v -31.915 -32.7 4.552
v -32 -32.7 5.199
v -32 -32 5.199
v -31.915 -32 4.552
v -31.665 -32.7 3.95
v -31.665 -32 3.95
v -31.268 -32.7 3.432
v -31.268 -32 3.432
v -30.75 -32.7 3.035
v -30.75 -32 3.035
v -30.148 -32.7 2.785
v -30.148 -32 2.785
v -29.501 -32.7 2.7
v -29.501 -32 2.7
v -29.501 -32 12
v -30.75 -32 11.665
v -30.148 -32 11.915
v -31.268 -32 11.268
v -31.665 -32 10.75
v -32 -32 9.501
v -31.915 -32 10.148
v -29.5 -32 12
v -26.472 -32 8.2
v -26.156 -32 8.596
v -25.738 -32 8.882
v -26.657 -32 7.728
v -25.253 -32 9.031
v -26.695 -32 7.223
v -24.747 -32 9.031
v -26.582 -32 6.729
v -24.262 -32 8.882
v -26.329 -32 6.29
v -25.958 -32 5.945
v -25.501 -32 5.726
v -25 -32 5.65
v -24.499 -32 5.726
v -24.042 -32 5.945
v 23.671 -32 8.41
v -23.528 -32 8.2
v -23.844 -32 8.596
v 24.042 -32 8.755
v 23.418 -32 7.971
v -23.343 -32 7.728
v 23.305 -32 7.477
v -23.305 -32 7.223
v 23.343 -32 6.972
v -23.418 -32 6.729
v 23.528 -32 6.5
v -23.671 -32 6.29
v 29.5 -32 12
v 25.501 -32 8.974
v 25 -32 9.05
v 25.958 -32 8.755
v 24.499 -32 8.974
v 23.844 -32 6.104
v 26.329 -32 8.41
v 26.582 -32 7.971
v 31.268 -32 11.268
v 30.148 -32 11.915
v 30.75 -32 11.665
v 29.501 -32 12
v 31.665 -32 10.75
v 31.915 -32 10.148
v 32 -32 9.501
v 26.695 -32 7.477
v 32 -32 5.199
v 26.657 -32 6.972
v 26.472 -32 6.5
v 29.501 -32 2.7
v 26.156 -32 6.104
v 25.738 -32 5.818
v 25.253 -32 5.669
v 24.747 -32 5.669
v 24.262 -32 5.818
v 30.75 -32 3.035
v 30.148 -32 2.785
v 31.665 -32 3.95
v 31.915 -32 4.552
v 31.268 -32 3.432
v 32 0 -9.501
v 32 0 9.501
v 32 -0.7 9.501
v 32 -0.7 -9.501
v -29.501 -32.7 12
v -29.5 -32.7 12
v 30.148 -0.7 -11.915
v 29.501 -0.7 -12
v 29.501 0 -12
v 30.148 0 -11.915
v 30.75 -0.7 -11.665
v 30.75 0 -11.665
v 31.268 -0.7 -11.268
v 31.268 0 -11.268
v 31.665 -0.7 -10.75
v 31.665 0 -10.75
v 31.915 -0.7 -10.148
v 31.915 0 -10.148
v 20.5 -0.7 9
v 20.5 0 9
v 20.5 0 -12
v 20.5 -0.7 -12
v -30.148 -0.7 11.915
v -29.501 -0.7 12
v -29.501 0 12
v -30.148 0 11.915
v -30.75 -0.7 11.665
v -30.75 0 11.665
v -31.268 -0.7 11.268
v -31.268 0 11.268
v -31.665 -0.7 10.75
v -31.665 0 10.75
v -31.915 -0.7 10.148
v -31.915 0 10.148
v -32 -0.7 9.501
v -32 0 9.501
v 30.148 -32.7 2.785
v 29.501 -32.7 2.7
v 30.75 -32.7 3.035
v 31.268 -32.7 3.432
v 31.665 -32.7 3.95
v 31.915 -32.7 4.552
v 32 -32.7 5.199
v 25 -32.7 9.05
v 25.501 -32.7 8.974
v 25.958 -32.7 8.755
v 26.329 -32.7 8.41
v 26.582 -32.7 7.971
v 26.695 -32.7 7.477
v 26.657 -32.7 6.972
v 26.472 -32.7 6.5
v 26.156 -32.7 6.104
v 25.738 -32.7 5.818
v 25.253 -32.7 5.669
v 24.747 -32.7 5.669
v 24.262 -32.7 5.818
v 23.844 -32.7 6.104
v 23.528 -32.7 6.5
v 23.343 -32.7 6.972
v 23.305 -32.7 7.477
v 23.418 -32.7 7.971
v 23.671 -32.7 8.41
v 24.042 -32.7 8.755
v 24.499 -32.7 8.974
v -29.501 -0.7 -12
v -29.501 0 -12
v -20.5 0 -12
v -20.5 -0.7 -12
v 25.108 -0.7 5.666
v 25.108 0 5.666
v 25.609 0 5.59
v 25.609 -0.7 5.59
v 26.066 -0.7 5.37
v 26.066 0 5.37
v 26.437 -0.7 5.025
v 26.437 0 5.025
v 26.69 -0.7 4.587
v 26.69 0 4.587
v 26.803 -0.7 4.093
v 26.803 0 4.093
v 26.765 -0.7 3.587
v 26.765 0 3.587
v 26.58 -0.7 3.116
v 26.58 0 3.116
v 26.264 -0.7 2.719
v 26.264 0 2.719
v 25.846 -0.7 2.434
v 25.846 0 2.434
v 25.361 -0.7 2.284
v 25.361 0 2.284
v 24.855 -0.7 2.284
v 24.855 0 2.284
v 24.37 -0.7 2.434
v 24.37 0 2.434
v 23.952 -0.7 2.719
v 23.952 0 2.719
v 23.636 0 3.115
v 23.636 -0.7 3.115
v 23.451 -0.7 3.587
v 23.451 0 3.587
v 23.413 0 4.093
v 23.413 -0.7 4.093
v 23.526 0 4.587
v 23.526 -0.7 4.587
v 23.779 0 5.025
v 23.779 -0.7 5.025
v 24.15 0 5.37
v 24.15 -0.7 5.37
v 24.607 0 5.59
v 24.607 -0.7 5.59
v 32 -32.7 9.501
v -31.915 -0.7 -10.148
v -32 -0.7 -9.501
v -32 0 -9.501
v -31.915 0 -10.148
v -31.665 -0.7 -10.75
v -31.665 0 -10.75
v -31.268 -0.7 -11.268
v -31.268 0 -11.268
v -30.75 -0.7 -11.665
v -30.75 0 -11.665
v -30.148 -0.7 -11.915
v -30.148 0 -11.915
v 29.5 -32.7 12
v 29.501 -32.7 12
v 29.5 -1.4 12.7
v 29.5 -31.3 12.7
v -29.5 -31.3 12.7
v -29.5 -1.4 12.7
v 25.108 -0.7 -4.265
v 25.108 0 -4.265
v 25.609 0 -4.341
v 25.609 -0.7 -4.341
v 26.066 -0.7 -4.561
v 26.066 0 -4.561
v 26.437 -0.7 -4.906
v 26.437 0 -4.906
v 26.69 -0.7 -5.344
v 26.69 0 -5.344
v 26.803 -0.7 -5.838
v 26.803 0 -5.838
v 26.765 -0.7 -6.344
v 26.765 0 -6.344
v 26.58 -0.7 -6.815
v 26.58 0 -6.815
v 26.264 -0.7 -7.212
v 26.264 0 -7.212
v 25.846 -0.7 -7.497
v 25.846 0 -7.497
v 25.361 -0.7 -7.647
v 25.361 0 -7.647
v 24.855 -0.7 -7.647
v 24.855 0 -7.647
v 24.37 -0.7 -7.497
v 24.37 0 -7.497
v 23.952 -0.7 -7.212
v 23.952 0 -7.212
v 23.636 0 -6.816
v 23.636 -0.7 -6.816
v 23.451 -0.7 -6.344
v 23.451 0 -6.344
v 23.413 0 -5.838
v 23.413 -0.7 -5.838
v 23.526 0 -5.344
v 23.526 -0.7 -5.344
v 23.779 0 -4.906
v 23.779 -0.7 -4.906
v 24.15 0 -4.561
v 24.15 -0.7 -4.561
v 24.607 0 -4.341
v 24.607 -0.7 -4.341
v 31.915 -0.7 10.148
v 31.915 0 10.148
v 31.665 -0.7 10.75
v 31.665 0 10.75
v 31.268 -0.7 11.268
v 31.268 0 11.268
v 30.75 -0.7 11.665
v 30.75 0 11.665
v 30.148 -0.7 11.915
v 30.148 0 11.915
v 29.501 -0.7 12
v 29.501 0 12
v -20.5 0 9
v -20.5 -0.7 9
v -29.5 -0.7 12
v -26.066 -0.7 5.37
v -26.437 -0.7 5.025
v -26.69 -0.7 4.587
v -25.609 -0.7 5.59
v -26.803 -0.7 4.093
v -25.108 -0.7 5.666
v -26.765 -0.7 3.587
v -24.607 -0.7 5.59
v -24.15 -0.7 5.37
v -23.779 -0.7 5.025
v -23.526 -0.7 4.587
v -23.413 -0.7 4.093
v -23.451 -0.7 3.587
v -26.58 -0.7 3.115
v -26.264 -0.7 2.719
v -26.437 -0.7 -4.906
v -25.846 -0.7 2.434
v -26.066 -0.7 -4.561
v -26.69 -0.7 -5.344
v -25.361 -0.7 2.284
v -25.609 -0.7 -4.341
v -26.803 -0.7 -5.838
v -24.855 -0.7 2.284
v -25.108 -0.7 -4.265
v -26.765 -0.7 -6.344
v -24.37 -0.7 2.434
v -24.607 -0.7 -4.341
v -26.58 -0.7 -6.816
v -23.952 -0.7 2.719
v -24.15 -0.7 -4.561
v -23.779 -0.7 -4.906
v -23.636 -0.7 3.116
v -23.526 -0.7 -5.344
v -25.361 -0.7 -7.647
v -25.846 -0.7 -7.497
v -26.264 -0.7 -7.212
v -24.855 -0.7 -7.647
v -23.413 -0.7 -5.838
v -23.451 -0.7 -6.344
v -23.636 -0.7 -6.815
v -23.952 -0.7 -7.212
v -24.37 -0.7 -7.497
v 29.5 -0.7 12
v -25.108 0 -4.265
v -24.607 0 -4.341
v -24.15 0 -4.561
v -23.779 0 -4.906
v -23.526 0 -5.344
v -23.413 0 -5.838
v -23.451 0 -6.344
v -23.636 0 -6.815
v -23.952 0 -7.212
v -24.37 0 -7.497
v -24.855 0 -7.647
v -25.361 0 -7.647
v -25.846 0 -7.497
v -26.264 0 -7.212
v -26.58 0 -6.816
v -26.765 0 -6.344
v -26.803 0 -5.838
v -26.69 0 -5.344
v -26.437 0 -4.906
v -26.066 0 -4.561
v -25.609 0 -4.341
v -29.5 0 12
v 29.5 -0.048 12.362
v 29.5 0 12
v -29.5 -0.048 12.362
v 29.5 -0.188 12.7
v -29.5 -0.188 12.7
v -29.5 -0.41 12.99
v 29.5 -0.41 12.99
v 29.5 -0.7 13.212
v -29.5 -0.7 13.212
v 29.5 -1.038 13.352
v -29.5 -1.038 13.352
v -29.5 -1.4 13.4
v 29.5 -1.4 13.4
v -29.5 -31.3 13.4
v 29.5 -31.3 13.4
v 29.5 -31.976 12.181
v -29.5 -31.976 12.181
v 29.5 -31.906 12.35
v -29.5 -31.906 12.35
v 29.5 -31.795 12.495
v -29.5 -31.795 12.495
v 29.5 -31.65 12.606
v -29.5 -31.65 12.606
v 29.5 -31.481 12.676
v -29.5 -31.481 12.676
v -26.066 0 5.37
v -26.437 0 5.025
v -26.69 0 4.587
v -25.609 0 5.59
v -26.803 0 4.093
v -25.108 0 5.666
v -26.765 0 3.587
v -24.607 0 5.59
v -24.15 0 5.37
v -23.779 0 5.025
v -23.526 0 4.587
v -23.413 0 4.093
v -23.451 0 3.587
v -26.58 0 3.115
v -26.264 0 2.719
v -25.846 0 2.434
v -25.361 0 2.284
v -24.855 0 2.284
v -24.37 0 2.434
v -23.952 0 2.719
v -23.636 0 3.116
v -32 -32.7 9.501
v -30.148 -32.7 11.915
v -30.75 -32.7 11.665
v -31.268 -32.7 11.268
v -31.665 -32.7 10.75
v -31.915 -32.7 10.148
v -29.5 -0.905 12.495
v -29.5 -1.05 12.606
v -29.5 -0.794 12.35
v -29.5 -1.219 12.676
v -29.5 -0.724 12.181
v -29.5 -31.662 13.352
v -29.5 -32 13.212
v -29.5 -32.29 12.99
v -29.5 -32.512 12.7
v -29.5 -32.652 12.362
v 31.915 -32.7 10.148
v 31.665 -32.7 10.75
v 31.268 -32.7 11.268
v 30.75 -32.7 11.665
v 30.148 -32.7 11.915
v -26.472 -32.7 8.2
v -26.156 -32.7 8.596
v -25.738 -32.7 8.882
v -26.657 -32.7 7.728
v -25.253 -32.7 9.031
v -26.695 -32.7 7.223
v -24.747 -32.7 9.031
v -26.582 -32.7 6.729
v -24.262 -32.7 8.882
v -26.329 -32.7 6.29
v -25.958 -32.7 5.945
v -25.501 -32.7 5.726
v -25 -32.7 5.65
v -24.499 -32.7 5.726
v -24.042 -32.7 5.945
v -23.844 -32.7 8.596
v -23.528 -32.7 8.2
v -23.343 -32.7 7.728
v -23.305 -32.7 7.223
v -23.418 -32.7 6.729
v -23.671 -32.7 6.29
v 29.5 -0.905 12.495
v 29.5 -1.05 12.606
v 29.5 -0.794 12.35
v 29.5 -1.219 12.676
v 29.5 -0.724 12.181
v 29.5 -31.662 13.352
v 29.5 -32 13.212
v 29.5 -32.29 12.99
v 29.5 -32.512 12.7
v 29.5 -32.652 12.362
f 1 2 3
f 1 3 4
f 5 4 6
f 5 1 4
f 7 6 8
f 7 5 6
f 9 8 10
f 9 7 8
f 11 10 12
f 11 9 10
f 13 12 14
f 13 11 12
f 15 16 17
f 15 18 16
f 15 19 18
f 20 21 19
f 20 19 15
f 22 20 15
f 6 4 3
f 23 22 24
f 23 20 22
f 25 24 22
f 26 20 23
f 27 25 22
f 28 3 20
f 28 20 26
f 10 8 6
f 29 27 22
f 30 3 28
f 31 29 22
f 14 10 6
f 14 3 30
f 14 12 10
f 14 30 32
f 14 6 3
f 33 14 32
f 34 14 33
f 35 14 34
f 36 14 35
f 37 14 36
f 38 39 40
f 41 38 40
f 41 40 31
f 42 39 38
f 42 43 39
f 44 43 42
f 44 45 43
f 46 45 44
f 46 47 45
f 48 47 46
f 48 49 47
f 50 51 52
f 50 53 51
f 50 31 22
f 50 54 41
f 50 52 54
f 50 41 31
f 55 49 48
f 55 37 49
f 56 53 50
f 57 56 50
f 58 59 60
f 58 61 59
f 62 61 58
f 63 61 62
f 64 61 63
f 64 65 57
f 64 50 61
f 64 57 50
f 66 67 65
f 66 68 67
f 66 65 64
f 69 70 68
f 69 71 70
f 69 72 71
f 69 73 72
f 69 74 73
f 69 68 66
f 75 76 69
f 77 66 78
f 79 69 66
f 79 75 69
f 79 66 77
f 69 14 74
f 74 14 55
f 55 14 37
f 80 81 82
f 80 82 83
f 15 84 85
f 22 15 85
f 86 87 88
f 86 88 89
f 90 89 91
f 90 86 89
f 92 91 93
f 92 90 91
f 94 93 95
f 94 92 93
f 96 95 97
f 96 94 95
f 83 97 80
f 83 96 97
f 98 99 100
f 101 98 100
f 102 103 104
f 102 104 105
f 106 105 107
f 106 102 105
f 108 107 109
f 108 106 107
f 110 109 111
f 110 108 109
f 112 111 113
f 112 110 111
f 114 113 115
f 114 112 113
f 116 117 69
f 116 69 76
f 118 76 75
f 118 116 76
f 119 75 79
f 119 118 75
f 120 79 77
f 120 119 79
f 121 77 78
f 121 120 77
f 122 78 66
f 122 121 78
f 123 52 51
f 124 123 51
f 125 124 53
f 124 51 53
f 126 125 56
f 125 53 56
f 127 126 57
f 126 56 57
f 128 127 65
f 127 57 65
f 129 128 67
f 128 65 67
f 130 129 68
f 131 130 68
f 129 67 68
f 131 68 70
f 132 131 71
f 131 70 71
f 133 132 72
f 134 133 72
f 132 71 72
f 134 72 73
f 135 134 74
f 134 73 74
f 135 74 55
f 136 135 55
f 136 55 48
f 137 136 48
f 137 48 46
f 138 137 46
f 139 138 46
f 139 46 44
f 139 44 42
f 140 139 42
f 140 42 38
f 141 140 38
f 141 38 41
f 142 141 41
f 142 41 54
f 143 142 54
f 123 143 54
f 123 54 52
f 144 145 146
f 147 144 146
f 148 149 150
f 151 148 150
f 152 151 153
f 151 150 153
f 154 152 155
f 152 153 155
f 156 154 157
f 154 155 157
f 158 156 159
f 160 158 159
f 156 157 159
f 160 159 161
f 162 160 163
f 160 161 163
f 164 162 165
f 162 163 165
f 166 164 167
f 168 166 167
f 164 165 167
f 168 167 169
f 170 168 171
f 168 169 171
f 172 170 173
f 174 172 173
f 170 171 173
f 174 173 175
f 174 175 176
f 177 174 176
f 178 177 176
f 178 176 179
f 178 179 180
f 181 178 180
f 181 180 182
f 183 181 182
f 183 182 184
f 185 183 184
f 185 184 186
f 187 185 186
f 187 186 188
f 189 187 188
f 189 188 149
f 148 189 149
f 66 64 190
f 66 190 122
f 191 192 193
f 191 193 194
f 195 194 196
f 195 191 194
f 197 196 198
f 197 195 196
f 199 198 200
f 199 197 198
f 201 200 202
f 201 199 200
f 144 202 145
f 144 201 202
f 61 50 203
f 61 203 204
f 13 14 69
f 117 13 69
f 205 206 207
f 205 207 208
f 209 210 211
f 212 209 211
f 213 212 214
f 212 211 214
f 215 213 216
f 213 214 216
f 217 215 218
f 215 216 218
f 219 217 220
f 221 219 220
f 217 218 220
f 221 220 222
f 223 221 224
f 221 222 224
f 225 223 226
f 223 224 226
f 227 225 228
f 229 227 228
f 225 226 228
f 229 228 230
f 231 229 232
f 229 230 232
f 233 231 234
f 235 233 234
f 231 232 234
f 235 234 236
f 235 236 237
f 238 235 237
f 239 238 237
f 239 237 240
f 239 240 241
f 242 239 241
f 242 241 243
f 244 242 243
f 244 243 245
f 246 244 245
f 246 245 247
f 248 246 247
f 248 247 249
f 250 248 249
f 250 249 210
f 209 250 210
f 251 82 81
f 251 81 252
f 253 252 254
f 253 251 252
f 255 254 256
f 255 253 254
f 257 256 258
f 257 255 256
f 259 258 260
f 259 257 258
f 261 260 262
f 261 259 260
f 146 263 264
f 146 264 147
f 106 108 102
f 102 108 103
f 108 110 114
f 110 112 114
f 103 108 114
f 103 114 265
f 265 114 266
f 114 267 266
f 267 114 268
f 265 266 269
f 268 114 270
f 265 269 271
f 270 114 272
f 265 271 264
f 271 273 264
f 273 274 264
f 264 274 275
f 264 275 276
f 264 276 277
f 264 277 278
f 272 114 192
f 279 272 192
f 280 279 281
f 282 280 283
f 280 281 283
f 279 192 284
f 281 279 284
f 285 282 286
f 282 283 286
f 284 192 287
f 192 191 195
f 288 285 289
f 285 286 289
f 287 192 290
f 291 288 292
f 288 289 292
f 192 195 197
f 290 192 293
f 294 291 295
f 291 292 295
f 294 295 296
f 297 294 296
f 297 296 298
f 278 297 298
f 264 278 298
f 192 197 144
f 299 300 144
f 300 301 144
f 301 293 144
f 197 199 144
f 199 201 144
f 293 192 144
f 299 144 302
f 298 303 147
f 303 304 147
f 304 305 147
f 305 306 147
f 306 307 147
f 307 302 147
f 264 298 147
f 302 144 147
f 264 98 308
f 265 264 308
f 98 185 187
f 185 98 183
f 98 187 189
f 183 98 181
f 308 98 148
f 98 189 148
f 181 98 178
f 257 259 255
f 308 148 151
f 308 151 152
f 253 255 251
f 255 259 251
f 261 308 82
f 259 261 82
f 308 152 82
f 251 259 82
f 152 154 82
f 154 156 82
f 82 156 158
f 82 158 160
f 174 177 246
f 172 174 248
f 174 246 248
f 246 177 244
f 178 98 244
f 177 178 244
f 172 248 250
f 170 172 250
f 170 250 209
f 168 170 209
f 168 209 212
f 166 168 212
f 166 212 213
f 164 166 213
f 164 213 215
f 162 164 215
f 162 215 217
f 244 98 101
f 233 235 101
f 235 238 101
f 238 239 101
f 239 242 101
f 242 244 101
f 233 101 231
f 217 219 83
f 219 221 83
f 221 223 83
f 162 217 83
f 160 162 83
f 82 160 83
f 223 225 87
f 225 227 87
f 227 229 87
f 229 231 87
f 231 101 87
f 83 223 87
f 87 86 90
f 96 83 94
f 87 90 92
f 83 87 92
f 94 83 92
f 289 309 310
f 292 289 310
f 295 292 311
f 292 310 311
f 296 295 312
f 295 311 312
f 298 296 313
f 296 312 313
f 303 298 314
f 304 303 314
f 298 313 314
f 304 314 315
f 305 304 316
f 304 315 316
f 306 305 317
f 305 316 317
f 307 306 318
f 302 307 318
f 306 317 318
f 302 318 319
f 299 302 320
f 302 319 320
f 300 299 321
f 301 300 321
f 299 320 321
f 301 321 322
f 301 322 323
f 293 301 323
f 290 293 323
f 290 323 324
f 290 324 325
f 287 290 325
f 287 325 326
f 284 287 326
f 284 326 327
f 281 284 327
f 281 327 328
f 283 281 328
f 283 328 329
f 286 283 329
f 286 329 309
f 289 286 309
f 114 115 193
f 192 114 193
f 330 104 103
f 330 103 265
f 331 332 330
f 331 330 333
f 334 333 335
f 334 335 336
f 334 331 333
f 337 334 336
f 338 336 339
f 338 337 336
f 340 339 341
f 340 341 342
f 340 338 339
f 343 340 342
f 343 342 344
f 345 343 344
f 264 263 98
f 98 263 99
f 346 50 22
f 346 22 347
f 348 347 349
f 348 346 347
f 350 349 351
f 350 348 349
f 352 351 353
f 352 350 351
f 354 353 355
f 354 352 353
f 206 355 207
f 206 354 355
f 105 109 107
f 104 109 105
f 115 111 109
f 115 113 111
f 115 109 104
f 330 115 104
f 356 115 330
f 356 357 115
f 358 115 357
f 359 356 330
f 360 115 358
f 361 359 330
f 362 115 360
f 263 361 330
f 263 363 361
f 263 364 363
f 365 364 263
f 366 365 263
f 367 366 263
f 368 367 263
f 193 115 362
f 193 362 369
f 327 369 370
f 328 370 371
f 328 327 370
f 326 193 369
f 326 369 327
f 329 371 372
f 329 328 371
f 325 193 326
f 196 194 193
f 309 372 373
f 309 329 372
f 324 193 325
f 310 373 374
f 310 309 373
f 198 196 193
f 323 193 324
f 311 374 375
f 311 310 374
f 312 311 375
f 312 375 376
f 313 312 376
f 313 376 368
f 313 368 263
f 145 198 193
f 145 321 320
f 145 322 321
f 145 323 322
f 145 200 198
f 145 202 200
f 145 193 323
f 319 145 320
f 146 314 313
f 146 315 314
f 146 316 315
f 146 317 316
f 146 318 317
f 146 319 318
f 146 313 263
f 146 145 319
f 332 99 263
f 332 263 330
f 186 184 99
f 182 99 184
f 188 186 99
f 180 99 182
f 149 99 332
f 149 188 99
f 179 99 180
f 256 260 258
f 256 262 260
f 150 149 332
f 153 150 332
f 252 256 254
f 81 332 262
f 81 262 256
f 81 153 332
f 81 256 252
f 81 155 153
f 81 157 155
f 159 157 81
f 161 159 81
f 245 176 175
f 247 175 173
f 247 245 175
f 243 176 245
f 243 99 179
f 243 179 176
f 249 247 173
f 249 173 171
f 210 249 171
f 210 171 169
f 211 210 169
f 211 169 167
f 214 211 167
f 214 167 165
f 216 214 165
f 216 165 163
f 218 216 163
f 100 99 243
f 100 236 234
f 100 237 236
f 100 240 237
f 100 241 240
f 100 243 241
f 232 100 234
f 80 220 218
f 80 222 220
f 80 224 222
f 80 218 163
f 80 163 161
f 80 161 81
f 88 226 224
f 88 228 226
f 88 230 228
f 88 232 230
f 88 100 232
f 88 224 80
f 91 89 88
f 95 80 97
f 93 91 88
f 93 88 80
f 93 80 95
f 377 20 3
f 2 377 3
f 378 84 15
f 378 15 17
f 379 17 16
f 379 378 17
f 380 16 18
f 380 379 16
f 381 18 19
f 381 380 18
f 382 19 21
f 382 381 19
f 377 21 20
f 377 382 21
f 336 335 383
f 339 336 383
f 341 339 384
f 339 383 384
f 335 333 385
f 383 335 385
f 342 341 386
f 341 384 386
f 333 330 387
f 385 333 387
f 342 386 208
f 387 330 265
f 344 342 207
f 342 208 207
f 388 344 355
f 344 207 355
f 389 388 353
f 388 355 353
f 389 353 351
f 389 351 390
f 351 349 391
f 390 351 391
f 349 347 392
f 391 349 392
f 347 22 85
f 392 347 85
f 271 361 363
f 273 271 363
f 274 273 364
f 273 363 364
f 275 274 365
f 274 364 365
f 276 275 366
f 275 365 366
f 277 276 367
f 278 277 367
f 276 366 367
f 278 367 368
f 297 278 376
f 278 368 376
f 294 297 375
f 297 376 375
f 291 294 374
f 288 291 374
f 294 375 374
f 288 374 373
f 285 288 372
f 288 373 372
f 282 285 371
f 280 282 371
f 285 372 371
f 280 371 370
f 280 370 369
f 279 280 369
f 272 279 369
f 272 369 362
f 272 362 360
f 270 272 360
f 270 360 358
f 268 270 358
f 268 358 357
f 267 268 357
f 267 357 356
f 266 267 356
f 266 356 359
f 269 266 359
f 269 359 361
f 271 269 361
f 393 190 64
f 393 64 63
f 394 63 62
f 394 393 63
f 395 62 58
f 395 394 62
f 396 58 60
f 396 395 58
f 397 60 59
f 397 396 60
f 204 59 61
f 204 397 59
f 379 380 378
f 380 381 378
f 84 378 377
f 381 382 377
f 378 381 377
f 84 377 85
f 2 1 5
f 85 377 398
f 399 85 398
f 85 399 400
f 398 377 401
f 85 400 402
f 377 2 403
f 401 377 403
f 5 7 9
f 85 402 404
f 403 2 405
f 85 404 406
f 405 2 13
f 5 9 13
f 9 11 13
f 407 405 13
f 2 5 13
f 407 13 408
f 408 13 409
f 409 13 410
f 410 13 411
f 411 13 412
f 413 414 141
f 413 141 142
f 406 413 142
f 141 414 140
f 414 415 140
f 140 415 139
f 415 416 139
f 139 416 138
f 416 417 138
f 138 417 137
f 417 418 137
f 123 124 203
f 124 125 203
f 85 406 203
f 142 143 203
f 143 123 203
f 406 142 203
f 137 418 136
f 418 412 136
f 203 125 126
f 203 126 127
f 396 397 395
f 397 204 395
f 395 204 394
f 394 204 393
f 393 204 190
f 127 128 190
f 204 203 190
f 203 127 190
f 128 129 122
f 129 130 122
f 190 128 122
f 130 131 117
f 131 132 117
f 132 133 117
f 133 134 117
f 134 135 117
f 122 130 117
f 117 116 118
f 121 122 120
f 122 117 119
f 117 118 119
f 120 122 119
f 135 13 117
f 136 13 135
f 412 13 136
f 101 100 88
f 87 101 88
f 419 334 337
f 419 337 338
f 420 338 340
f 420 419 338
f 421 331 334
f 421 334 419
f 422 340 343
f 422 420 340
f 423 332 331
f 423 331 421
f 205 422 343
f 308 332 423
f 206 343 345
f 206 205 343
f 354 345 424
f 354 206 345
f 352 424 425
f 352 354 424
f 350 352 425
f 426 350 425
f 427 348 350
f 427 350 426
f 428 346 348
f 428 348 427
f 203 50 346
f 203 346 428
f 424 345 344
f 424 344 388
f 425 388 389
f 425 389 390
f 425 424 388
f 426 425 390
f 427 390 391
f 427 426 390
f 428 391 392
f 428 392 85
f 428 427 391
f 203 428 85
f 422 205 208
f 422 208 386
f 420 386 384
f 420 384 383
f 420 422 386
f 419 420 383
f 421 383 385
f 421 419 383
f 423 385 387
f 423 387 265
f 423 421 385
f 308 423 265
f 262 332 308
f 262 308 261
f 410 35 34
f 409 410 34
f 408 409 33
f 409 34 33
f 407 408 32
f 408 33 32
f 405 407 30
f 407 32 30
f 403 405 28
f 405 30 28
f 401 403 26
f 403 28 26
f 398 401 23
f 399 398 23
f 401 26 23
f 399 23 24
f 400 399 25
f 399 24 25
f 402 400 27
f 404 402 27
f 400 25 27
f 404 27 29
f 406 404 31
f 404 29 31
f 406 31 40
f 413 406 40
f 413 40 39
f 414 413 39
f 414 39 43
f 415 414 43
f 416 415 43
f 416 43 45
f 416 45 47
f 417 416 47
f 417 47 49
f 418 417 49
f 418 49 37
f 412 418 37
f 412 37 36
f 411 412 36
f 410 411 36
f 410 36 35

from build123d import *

# Parameters (mm, degrees)
SKETCH4_W                    = 64
SKETCH4_H                    = 24
BASE_FLANGE2_DEPTH           = 0.7
CUT_EXTRUDE1_REACH           = 36.183
SKETCH7_W                    = 41
SKETCH7_H                    = 21
CUT_EXTRUDE2_REACH           = 36.183
SKETCH8_R                    = 1.7
EDGE_FLANGE1_DEPTH           = 59
EDGE_FLANGE2_STRIP_W         = 4.2
EDGE_FLANGE2_STRIP_H         = 0.7
EDGE_FLANGE2_STRIP_CUT_DEPTH = 59
EDGE_FLANGE2_DEPTH           = 59
SKETCH16_W                   = 2.5
SKETCH16_H                   = 9.3
TAB1_DEPTH                   = 0.7
CUT_EXTRUDE3_REACH           = 49.197
SKETCH15_R                   = 1.7
BREAK_CORNER1_START          = -32.7
BREAK_CORNER1_DEPTH          = 32.7
BREAK_CORNER1_2_DEPTH        = 0.7


# Read off the part's stored shape, not the designer's step: Break-Corner1
# Sheet-metal steps are written as plain solids
with BuildPart() as part:
    # Sketch4 → Base-Flange2 (new body)
    with BuildSketch(Plane(origin=(0, 0, 0), x_dir=(1, 0, 0), z_dir=(0, 1, 0))):
        Rectangle(SKETCH4_W, SKETCH4_H)
    extrude(amount=-BASE_FLANGE2_DEPTH)

    # Sketch7 → Cut-Extrude1 (cut, up to next)
    with BuildSketch(Plane(origin=(0, 0, 0), x_dir=(1, 0, 0), z_dir=(0, 1, 0)), mode=Mode.PRIVATE) as cut_extrude1_sk1:
        with Locations((0, 1.5)):
            Rectangle(SKETCH7_W, SKETCH7_H)
    cut_extrude1_tool1 = extrude(cut_extrude1_sk1.sketch, amount=-CUT_EXTRUDE1_REACH, mode=Mode.PRIVATE) & part.part
    add(cut_extrude1_tool1.solids().sort_by_distance((0, 0, -1.5))[0], mode=Mode.SUBTRACT)

    # Sketch8 → Cut-Extrude2 (cut, up to next)
    with BuildSketch(Plane(origin=(0, 0, 0), x_dir=(1, 0, 0), z_dir=(0, 1, 0)), mode=Mode.PRIVATE) as cut_extrude2_sk1:
        with Locations(Location((-25.108, -3.9655, 0), (0, 0, 270))):
            Circle(SKETCH8_R)
    cut_extrude2_tool1 = extrude(cut_extrude2_sk1.sketch, amount=-CUT_EXTRUDE2_REACH, mode=Mode.PRIVATE) & part.part
    # Sketch8 → Cut-Extrude2 (cut, up to next)
    with BuildSketch(Plane(origin=(0, 0, 0), x_dir=(1, 0, 0), z_dir=(0, 1, 0)), mode=Mode.PRIVATE) as cut_extrude2_sk2:
        with Locations(Location((-25.108, 5.9655, 0), (0, 0, 270))):
            Circle(SKETCH8_R)
    cut_extrude2_tool2 = extrude(cut_extrude2_sk2.sketch, amount=-CUT_EXTRUDE2_REACH, mode=Mode.PRIVATE) & part.part
    # Sketch8 → Cut-Extrude2 (cut, up to next)
    with BuildSketch(Plane(origin=(0, 0, 0), x_dir=(1, 0, 0), z_dir=(0, 1, 0)), mode=Mode.PRIVATE) as cut_extrude2_sk3:
        with Locations(Location((25.108, -3.9655, 0), (0, 0, 270))):
            Circle(SKETCH8_R)
    cut_extrude2_tool3 = extrude(cut_extrude2_sk3.sketch, amount=-CUT_EXTRUDE2_REACH, mode=Mode.PRIVATE) & part.part
    # Sketch8 → Cut-Extrude2 (cut, up to next)
    with BuildSketch(Plane(origin=(0, 0, 0), x_dir=(1, 0, 0), z_dir=(0, 1, 0)), mode=Mode.PRIVATE) as cut_extrude2_sk4:
        with Locations(Location((25.108, 5.9655, 0), (0, 0, 270))):
            Circle(SKETCH8_R)
    cut_extrude2_tool4 = extrude(cut_extrude2_sk4.sketch, amount=-CUT_EXTRUDE2_REACH, mode=Mode.PRIVATE) & part.part
    add(cut_extrude2_tool1.solids().sort_by_distance((-25.108, 0, 3.9655))[0], mode=Mode.SUBTRACT)
    add(cut_extrude2_tool2.solids().sort_by_distance((-25.108, 0, -5.9655))[0], mode=Mode.SUBTRACT)
    add(cut_extrude2_tool3.solids().sort_by_distance((25.108, 0, 3.9655))[0], mode=Mode.SUBTRACT)
    add(cut_extrude2_tool4.solids().sort_by_distance((25.108, 0, -5.9655))[0], mode=Mode.SUBTRACT)

    # Edge-Flange1 section (across the edge) → Edge-Flange1 (add)
    with BuildSketch(Plane(origin=(29.5, -0.7, 12.7), x_dir=(0, 0, -1), z_dir=(-1, 0, 0))):
        with BuildLine():
            Line((-0.7, 0.7), (-0.7, 32))
            Line((-0.7, 32), (0, 32))
            Line((0, 32), (0, 0.7))
            ThreePointArc((0, 0.7), (0.205025253, 0.205025253), (0.7, 0))
            Line((0.7, 0), (0.7, -0.7))
            ThreePointArc((0.7, -0.7), (-0.289949494, -0.289949494), (-0.7, 0.7))
        make_face()
    extrude(amount=EDGE_FLANGE1_DEPTH)

    # Edge-Flange2 strip (across the edge) → Edge-Flange2 strip cut (cut)
    with BuildSketch(Plane(origin=(29.5, -32.7, 12.7), x_dir=(0, 1, 0), z_dir=(-1, 0, 0))):
        with Locations((-0.7, -0.35)):
            Rectangle(EDGE_FLANGE2_STRIP_W, EDGE_FLANGE2_STRIP_H)
    extrude(amount=EDGE_FLANGE2_STRIP_CUT_DEPTH, mode=Mode.SUBTRACT)

    # Edge-Flange2 section (across the edge) → Edge-Flange2 (add)
    with BuildSketch(Plane(origin=(29.5, -32.7, 12.7), x_dir=(0, 1, 0), z_dir=(-1, 0, 0))):
        with BuildLine():
            Line((0, 0.7), (0, 10))
            Line((0, 10), (0.7, 10))
            Line((0.7, 10), (0.7, 0.7))
            ThreePointArc((0.7, 0.7), (0.905025253, 0.205025253), (1.4, 0))
            Line((1.4, 0), (1.4, -0.7))
            ThreePointArc((1.4, -0.7), (0.410050506, -0.289949494), (0, 0.7))
        make_face()
    extrude(amount=EDGE_FLANGE2_DEPTH)

    # Sketch16 → Tab1 (add)
    with BuildSketch(Plane(origin=(0, -32, 0), x_dir=(1, 0, 0), z_dir=(0, 1, 0))):
        with Locations((-30.75, -7.35)):
            Rectangle(SKETCH16_W, SKETCH16_H)
        with Locations((30.75, -7.35)):
            Rectangle(SKETCH16_W, SKETCH16_H)
    extrude(amount=-TAB1_DEPTH)

    # Sketch15 → Cut-Extrude3 (cut, up to next)
    with BuildSketch(Plane(origin=(0, -32, 0), x_dir=(1, 0, 0), z_dir=(0, 1, 0)), mode=Mode.PRIVATE) as cut_extrude3_sk1:
        with Locations(Location((25, -7.35, 0), (0, 0, 270))):
            Circle(SKETCH15_R)
    cut_extrude3_tool1 = extrude(cut_extrude3_sk1.sketch, amount=-CUT_EXTRUDE3_REACH, mode=Mode.PRIVATE) & part.part
    # Sketch15 → Cut-Extrude3 (cut, up to next)
    with BuildSketch(Plane(origin=(0, -32, 0), x_dir=(1, 0, 0), z_dir=(0, 1, 0)), mode=Mode.PRIVATE) as cut_extrude3_sk2:
        with Locations(Location((-25, -7.35, 0), (0, 0, 90))):
            Circle(SKETCH15_R)
    cut_extrude3_tool2 = extrude(cut_extrude3_sk2.sketch, amount=-CUT_EXTRUDE3_REACH, mode=Mode.PRIVATE) & part.part
    add(cut_extrude3_tool1.solids().sort_by_distance((25, -32, 7.35))[0], mode=Mode.SUBTRACT)
    add(cut_extrude3_tool2.solids().sort_by_distance((-25, -32, 7.35))[0], mode=Mode.SUBTRACT)

    # Break-Corner1 outline → Break-Corner1 (cut)
    with BuildSketch(Plane(origin=(0, 0, 0), x_dir=(1, 0, 0), z_dir=(0, 1, 0)).offset(BREAK_CORNER1_START)):
        with BuildLine():
            Line((-32, 12), (-32, 9.501))
            ThreePointArc((-32, 9.501), (-31.268059846, 11.268059846), (-29.501, 12))
            Line((-29.501, 12), (-32, 12))
        make_face()
        with BuildLine():
            ThreePointArc((29.501, 12), (31.268059846, 11.268059846), (32, 9.501))
            Line((32, 9.501), (32, 12))
            Line((32, 12), (29.501, 12))
        make_face()
        with BuildLine():
            Line((32, -12), (32, -9.501))
            ThreePointArc((32, -9.501), (31.268059846, -11.268059846), (29.501, -12))
            Line((29.501, -12), (32, -12))
        make_face()
        with BuildLine():
            ThreePointArc((-29.501, -12), (-31.268059846, -11.268059846), (-32, -9.501))
            Line((-32, -9.501), (-32, -12))
            Line((-32, -12), (-29.501, -12))
        make_face()
    extrude(amount=BREAK_CORNER1_DEPTH, mode=Mode.SUBTRACT)

    # Break-Corner1 2 outline → Break-Corner1 2 (cut)
    with BuildSketch(Plane(origin=(0, 0, 0), x_dir=(1, 0, 0), z_dir=(0, 1, 0)).offset(BREAK_CORNER1_START)):
        with BuildLine():
            Line((32, -2.7), (29.501, -2.7))
            ThreePointArc((29.501, -2.7), (31.268059846, -3.431940154), (32, -5.199))
            Line((32, -5.199), (32, -2.7))
        make_face()
        with BuildLine():
            Line((-32, -2.7), (-32, -5.199))
            ThreePointArc((-32, -5.199), (-31.268059846, -3.431940154), (-29.501, -2.7))
            Line((-29.501, -2.7), (-32, -2.7))
        make_face()
    extrude(amount=BREAK_CORNER1_2_DEPTH, mode=Mode.SUBTRACT)


solid = part.part
